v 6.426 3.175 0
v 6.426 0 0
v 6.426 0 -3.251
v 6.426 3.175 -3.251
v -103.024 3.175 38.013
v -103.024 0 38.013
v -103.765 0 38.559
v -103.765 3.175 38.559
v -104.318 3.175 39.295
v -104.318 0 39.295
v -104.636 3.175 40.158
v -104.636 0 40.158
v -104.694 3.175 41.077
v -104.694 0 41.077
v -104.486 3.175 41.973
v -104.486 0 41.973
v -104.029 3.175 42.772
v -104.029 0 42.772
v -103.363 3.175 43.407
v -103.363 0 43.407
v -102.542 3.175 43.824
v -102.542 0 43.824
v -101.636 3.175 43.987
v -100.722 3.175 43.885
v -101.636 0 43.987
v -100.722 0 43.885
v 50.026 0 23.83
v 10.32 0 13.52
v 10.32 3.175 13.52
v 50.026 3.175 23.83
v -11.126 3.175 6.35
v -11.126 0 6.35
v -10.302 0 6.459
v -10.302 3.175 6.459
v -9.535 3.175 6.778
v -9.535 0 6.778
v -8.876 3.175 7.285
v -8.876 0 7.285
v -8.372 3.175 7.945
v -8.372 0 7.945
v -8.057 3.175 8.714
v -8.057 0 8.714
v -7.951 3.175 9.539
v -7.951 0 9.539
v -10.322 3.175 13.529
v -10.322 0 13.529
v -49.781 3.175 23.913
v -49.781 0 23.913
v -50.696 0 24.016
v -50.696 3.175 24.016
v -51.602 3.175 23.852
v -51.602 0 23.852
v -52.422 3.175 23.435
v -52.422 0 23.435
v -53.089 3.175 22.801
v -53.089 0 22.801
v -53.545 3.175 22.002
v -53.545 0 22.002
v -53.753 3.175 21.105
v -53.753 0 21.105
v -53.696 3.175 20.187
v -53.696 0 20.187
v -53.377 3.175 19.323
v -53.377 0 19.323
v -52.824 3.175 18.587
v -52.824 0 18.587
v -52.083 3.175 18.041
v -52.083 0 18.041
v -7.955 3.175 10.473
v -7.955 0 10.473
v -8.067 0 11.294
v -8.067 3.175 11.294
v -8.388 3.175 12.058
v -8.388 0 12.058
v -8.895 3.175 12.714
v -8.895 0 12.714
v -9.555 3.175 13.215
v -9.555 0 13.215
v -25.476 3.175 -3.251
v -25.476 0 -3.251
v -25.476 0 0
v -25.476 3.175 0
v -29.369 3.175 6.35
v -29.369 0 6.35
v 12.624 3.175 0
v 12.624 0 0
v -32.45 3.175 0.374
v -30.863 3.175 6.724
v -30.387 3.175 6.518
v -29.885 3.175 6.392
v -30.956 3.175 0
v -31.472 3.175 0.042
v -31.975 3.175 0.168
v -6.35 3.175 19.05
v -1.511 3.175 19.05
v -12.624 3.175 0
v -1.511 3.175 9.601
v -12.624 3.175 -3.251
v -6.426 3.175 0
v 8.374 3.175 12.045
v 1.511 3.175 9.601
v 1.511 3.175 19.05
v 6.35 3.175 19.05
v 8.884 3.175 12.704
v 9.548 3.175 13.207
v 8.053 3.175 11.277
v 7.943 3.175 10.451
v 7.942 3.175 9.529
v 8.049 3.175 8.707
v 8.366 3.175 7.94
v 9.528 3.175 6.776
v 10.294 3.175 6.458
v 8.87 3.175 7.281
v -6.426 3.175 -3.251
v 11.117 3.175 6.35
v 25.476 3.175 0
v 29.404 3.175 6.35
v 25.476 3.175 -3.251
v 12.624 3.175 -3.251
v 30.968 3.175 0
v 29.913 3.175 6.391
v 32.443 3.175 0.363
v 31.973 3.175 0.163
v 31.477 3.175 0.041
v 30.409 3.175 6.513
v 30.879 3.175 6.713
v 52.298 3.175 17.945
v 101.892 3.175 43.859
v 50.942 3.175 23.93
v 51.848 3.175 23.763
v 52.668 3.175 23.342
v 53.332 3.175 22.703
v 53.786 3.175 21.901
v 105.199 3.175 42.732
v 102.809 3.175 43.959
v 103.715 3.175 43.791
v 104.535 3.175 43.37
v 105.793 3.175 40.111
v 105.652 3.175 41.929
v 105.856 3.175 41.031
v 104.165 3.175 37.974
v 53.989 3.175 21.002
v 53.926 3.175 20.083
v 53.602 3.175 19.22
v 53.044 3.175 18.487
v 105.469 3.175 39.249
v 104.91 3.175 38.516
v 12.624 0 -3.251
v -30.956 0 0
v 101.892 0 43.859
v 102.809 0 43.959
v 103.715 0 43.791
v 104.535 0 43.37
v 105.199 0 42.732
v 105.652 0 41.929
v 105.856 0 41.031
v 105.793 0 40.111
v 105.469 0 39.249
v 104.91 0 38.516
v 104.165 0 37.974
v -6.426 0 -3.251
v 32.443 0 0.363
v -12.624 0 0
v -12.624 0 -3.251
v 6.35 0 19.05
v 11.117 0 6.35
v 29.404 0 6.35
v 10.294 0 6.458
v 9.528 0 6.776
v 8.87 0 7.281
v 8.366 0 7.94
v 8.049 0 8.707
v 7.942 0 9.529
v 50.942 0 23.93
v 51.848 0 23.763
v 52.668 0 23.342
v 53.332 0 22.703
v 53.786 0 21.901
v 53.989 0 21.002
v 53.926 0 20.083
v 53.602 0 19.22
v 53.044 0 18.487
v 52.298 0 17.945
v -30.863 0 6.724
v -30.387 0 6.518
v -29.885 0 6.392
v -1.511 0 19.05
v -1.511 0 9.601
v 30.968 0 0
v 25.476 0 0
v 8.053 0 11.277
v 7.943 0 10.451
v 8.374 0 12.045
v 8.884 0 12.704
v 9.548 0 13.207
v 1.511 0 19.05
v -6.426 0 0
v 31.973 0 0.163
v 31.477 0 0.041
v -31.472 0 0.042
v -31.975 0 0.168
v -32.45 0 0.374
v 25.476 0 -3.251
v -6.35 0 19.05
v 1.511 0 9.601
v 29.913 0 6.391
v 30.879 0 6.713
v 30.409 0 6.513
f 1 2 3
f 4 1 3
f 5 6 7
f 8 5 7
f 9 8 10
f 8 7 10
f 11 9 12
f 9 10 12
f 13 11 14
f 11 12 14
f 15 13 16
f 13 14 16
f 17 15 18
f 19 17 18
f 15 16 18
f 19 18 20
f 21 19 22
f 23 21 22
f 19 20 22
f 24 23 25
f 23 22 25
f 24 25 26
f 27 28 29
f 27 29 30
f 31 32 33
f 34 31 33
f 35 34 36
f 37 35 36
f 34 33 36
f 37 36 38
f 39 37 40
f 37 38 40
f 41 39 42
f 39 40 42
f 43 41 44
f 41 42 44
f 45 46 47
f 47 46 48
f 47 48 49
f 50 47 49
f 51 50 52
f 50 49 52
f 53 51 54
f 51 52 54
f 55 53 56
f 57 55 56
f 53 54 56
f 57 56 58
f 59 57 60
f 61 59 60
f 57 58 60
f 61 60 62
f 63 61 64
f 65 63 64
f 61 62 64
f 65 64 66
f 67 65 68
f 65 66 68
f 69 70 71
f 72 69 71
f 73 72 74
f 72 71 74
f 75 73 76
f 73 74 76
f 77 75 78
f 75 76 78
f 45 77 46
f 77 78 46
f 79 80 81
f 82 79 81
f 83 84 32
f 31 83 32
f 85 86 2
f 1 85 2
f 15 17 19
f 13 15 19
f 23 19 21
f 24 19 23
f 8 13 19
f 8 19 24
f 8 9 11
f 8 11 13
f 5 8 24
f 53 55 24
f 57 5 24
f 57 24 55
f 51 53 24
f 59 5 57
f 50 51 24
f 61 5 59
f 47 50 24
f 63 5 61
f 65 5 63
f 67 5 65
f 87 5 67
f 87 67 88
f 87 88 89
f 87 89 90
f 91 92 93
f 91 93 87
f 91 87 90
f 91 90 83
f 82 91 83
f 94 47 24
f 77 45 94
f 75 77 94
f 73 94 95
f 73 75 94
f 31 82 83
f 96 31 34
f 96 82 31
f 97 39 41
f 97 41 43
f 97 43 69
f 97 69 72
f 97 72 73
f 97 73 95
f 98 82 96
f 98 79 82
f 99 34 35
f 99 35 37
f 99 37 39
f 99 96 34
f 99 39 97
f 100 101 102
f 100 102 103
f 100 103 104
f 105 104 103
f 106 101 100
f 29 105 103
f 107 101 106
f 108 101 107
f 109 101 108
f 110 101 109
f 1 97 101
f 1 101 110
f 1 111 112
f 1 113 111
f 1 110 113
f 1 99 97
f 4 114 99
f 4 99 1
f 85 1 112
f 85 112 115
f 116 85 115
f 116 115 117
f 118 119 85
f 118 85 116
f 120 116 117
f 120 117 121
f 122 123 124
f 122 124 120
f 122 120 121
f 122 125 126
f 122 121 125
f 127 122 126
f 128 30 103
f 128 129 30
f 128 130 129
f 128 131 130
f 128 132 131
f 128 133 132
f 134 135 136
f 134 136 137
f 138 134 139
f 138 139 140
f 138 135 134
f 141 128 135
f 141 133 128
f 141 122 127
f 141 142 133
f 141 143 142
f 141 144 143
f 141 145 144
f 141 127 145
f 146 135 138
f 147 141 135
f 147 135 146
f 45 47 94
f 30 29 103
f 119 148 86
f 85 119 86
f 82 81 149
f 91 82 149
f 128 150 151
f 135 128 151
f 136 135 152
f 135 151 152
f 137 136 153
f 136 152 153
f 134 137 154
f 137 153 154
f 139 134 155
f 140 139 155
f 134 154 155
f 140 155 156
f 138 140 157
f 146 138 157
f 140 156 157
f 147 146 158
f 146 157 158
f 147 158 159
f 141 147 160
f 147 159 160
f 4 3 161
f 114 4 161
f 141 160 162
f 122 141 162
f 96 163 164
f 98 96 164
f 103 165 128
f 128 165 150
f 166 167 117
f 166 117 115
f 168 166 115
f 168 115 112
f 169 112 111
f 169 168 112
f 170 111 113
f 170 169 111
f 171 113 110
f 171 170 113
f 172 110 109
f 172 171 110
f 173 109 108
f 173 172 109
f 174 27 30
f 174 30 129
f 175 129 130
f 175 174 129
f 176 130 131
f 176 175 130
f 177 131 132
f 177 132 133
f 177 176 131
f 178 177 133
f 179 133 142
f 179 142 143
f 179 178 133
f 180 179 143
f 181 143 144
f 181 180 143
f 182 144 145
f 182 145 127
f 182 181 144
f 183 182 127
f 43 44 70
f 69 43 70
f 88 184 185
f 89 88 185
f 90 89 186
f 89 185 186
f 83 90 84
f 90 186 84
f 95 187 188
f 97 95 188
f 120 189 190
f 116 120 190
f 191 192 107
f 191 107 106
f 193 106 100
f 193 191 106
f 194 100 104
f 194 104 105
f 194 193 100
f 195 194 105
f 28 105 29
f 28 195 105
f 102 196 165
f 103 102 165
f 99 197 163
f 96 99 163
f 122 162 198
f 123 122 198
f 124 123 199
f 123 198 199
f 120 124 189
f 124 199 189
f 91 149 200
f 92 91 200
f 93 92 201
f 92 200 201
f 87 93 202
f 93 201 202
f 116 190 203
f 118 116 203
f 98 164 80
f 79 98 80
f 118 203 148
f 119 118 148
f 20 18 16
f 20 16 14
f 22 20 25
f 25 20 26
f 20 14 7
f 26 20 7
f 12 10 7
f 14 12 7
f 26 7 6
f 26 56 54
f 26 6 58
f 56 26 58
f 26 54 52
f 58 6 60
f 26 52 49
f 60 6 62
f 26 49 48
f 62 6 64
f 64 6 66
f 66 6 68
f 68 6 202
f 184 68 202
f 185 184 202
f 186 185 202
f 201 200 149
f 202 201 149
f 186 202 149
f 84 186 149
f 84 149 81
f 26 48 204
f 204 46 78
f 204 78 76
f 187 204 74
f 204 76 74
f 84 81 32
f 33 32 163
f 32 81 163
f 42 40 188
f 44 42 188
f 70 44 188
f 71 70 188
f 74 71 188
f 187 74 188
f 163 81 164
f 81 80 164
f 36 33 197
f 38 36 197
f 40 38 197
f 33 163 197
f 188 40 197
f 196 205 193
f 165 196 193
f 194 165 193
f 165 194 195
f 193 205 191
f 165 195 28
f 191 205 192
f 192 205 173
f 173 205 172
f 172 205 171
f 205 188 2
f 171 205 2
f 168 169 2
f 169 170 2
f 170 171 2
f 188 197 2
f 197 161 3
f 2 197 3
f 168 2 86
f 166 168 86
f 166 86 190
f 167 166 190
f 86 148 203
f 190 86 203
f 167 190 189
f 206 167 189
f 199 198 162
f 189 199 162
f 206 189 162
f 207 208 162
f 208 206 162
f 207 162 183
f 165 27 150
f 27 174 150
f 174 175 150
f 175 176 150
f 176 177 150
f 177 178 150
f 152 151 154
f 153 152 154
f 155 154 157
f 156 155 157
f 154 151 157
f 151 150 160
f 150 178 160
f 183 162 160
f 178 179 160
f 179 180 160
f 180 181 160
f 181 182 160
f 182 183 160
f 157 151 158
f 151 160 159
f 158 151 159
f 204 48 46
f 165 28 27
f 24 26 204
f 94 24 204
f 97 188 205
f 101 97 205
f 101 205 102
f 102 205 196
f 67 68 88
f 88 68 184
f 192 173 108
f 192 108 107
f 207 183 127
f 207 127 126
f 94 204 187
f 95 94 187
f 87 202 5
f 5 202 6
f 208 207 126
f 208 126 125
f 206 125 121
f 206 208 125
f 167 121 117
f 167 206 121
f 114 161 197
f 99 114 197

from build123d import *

# Parameters (mm, degrees)
BOSS_EXTRUDE1_DEPTH = 3.175


with BuildPart() as part:
    # Sketch2 → Boss-Extrude1 (new body)
    with BuildSketch(Plane(origin=(0, 0, 0), x_dir=(1, 0, 0), z_dir=(0, 1, 0))):
        with BuildLine():
            Line((-1.5113, -19.05), (-1.5113, -9.6012))
            Line((-1.5113, -9.6012), (1.5113, -9.6012))
            Line((1.5113, -9.6012), (1.5113, -19.05))
            Line((1.5113, -19.05), (6.35, -19.05))
            Line((6.35, -19.05), (101.892440563, -43.858854449))
            ThreePointArc((101.892440563, -43.858854449), (105.652252874, -41.929489283), (104.164919451, -37.973926385))
            Line((104.164919451, -37.973926385), (32.442533737, -0.363160318))
            ThreePointArc((32.442533737, -0.363160318), (31.727309935, -0.092126666), (30.968022767, 0))
            Line((30.968022767, 0), (25.4762, 0))
            Line((25.4762, 0), (25.4762, 3.2512))
            Line((25.4762, 3.2512), (12.6238, 3.2512))
            Line((12.6238, 3.2512), (12.6238, 0))
            Line((12.6238, 0), (6.4262, 0))
            Line((6.4262, 0), (6.4262, 3.2512))
            Line((6.4262, 3.2512), (-6.4262, 3.2512))
            Line((-6.4262, 3.2512), (-6.4262, 0))
            Line((-6.4262, 0), (-12.6238, 0))
            Line((-12.6238, 0), (-12.6238, 3.2512))
            Line((-12.6238, 3.2512), (-25.4762, 3.2512))
            Line((-25.4762, 3.2512), (-25.4762, 0))
            Line((-25.4762, 0), (-30.95625, 0))
            ThreePointArc((-30.95625, 0), (-31.726300609, -0.094797562), (-32.450367647, -0.373529412))
            Line((-32.450367647, -0.373529412), (-103.023886624, -38.012739533))
            ThreePointArc((-103.023886624, -38.012739533), (-104.485708905, -41.973107934), (-100.721752751, -43.884671777))
            Line((-100.721752751, -43.884671777), (-6.35, -19.05))
            Line((-6.35, -19.05), (-1.5113, -19.05))
        make_face()
        with BuildLine():
            Line((-52.083424577, -18.041159774), (-30.862867647, -6.723529412))
            ThreePointArc((-30.862867647, -6.723529412), (-30.138800609, -6.444797562), (-29.36875, -6.35))
            Line((-29.36875, -6.35), (-11.126341516, -6.35))
            ThreePointArc((-11.126341516, -6.35), (-8.876399737, -7.28482434), (-7.951371556, -9.538811345))
            Line((-7.951371556, -9.538811345), (-7.955433254, -10.472519677))
            ThreePointArc((-7.955433254, -10.472519677), (-8.620060106, -12.402622549), (-10.322386989, -13.529169988))
            Line((-10.322386989, -13.529169988), (-49.781290705, -23.913092018))
            ThreePointArc((-49.781290705, -23.913092018), (-53.545246858, -22.001528175), (-52.083424577, -18.041159774))
        make_face(mode=Mode.SUBTRACT)
        with BuildLine():
            Line((7.941592001, -9.529086738), (7.942778948, -10.451228904))
            ThreePointArc((7.942778948, -10.451228904), (8.607635671, -12.39131781), (10.3198084, -13.520230548))
            Line((10.3198084, -13.520230548), (50.025691322, -23.830386583))
            ThreePointArc((50.025691322, -23.830386583), (53.785503632, -21.901021417), (52.29817021, -17.945458519))
            Line((52.29817021, -17.945458519), (30.878579271, -6.713160318))
            ThreePointArc((30.878579271, -6.713160318), (30.163355469, -6.442126666), (29.404068301, -6.35))
            Line((29.404068301, -6.35), (11.116589371, -6.35))
            ThreePointArc((11.116589371, -6.35), (8.870080926, -7.281381315), (7.941592001, -9.529086738))
        make_face(mode=Mode.SUBTRACT)
    extrude(amount=BOSS_EXTRUDE1_DEPTH)


solid = part.part
